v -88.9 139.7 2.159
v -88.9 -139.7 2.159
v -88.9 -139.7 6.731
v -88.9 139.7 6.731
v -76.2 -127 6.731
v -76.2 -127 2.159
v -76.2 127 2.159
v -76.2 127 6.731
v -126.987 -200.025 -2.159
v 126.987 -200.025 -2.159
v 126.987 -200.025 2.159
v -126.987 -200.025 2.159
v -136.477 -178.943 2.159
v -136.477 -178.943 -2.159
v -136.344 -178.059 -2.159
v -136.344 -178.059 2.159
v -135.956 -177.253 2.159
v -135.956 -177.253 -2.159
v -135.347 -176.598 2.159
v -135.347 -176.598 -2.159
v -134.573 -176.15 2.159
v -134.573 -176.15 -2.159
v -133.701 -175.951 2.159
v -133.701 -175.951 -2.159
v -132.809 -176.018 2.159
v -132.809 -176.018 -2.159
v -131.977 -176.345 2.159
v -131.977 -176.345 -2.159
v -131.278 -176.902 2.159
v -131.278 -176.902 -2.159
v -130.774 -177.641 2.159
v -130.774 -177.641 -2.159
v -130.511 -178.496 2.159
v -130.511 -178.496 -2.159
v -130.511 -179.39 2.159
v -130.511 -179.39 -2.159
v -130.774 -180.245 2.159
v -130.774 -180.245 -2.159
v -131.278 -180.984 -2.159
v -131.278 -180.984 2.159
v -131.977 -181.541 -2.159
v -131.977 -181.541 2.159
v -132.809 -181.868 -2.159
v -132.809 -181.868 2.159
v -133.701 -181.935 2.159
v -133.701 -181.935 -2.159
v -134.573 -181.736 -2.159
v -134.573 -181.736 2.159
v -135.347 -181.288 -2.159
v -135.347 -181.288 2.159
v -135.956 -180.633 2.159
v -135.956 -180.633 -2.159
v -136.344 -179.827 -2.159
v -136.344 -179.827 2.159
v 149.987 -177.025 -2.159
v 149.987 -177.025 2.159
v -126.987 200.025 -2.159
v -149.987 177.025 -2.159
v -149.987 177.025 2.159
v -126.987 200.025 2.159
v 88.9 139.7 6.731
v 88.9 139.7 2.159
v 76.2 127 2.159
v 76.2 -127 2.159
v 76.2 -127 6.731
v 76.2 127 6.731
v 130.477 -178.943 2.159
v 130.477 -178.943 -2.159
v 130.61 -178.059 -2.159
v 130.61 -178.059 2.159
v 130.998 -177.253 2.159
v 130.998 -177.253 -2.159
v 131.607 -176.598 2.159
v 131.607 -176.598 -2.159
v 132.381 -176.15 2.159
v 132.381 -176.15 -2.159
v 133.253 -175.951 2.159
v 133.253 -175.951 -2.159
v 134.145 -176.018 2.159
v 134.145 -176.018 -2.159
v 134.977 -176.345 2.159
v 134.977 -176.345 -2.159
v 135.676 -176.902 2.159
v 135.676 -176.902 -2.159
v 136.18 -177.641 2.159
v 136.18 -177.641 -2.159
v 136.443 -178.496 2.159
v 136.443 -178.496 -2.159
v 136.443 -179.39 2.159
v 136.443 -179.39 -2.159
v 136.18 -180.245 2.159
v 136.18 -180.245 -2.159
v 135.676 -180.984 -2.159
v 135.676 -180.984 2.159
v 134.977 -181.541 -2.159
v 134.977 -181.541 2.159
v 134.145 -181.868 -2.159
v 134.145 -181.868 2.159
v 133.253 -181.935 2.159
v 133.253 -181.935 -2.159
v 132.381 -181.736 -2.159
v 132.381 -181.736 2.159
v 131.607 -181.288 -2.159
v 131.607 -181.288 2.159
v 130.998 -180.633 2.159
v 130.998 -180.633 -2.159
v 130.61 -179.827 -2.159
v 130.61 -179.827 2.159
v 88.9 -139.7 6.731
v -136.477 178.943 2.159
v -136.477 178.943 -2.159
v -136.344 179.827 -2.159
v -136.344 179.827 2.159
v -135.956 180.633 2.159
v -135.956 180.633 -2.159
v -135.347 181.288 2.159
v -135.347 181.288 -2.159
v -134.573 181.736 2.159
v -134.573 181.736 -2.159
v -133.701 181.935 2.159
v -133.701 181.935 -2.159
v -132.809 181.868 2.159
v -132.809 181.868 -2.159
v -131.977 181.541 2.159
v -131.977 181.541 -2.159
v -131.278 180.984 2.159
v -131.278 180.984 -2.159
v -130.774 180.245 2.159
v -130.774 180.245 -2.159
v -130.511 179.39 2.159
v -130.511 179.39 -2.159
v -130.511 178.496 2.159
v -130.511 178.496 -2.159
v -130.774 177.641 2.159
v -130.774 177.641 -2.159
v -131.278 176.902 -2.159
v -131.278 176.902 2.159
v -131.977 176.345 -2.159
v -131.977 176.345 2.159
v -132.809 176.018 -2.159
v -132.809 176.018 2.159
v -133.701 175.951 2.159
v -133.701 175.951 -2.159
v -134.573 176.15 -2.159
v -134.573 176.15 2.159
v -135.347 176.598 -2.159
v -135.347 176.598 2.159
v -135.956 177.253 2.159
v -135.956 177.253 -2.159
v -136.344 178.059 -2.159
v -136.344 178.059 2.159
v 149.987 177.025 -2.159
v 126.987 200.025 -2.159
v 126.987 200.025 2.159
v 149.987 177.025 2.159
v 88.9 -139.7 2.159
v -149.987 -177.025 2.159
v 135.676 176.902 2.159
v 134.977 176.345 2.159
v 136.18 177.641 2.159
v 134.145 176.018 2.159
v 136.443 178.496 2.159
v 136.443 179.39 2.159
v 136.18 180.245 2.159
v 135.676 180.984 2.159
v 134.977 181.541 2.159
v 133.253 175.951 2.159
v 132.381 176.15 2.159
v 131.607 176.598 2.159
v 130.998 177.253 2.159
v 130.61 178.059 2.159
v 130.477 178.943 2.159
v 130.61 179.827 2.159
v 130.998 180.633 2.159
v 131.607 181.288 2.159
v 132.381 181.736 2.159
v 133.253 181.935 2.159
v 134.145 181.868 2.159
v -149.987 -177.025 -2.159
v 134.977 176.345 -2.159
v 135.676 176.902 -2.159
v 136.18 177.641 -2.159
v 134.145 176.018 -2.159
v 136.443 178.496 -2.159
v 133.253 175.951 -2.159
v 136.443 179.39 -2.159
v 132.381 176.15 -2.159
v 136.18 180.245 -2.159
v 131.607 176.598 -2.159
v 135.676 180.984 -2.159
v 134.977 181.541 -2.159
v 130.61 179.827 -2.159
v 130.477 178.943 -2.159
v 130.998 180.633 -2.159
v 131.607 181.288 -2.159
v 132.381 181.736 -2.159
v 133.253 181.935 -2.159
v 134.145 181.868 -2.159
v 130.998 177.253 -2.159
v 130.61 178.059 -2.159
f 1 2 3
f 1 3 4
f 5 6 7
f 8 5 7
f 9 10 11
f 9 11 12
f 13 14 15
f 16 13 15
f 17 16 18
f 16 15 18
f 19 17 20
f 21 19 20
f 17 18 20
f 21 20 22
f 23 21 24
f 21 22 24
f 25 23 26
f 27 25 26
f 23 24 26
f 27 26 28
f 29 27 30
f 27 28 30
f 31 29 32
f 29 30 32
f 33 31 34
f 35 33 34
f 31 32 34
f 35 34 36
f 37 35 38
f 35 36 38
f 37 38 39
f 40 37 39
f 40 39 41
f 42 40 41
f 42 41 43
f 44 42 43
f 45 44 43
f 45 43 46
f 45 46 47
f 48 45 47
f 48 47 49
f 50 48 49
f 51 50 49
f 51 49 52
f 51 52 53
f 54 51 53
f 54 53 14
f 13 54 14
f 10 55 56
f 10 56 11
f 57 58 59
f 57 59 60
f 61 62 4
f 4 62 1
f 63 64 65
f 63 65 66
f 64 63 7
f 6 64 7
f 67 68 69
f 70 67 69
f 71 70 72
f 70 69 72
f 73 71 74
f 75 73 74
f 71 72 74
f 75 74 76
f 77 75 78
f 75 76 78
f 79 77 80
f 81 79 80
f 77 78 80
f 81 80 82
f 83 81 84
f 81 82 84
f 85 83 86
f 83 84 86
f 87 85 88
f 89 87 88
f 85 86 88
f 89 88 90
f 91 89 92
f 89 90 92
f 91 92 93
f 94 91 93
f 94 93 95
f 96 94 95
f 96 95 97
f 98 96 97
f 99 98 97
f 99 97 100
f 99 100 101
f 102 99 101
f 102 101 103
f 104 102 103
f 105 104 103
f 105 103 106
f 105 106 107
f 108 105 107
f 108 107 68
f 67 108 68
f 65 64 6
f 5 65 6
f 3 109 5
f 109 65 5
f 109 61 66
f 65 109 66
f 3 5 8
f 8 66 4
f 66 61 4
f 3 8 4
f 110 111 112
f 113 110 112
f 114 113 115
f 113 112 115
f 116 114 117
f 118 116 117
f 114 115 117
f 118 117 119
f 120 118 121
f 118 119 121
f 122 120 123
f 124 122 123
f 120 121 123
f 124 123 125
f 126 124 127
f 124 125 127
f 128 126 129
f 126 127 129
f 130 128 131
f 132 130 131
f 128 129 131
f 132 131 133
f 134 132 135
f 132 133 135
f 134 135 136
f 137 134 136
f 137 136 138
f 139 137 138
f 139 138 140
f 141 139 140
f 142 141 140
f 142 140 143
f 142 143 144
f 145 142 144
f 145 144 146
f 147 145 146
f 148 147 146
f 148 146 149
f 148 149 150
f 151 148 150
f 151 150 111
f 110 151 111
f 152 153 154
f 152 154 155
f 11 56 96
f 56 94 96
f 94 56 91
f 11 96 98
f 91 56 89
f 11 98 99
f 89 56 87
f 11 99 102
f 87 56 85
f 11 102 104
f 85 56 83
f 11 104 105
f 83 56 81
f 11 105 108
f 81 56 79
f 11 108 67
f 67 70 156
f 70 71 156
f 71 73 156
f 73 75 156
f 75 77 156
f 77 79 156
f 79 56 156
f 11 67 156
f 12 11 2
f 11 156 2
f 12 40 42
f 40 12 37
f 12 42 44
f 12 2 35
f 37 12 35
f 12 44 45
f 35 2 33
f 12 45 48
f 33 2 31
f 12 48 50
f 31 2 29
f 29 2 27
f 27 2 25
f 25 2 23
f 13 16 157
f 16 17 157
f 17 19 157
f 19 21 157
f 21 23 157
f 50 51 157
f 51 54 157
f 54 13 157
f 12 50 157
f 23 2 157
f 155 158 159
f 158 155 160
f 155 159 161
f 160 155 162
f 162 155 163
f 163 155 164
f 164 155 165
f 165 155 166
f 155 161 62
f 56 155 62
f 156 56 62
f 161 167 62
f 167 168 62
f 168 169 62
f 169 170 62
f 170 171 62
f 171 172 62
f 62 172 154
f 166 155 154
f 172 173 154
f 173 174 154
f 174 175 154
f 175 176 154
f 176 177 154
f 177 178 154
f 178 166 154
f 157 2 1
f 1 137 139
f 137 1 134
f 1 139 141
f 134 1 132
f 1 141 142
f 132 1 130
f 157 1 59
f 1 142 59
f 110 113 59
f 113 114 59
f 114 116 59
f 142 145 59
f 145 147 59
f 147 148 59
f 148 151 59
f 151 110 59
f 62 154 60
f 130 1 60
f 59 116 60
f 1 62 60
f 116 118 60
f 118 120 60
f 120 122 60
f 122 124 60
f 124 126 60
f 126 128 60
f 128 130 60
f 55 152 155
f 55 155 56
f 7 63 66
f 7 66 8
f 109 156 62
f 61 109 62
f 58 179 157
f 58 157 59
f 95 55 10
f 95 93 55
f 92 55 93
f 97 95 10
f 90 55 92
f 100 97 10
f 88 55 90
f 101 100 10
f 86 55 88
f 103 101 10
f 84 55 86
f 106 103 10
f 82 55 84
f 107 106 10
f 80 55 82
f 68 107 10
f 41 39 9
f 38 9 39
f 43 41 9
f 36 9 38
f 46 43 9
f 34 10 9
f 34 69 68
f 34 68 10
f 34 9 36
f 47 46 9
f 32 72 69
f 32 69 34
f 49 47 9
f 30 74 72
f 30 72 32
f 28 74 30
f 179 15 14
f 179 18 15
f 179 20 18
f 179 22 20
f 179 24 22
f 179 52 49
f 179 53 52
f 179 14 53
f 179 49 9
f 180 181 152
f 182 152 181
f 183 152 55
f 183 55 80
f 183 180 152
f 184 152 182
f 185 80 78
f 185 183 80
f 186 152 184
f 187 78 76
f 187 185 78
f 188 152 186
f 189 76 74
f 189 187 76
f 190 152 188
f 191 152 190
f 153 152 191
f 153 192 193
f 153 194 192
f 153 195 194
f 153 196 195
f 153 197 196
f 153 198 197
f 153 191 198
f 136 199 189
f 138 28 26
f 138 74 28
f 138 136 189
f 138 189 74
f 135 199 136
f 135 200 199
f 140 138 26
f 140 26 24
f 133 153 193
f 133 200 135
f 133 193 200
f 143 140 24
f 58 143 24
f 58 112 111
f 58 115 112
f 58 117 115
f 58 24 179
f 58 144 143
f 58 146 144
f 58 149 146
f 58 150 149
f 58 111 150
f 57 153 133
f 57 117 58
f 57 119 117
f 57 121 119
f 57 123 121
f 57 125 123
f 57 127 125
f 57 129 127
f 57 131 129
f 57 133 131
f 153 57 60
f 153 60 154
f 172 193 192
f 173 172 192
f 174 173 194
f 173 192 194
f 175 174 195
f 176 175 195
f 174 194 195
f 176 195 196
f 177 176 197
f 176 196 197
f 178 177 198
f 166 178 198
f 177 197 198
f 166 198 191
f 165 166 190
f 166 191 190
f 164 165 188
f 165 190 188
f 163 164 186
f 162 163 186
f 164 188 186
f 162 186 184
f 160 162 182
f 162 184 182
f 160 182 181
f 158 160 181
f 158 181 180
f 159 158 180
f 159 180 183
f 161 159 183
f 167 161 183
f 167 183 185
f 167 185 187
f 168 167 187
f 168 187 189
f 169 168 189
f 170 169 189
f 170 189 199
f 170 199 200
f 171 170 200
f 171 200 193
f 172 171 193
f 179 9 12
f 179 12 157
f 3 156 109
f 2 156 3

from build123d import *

# Parameters (mm, degrees)
BOSS_EXTRUDE1_DEPTH      = 2.159
BOSS_EXTRUDE1_DEPTH_BACK = 2.159
SKETCH6_W                = 177.8
SKETCH6_H                = 279.4
SKETCH6_W_2              = 152.4
SKETCH6_H_2              = 254
BOSS_EXTRUDE2_DEPTH      = 8.89
SKETCH7_R                = 3
CUT_EXTRUDE2_DEPTH       = 251.170207847


with BuildPart() as part:
    # Sketch3 → Boss-Extrude1 (new, two sides: drawn at the far end of the back side and taken through both)
    with BuildSketch(Plane.XY.offset(-BOSS_EXTRUDE1_DEPTH_BACK)):
        Polygon((-149.987, 177.025), (-126.987, 200.025), (126.987, 200.025), (149.987, 177.025), (149.987, -177.025), (126.987, -200.025), (-126.987, -200.025), (-149.987, -177.025), align=None)
    extrude(amount=BOSS_EXTRUDE1_DEPTH + BOSS_EXTRUDE1_DEPTH_BACK)

    # Sketch6 → Boss-Extrude2 (add)
    with BuildSketch(Plane(origin=(0, 0, -2.159), x_dir=(-1, 0, 0), z_dir=(0, 0, -1))):
        Rectangle(SKETCH6_W, SKETCH6_H)
        Rectangle(SKETCH6_W_2, SKETCH6_H_2, mode=Mode.SUBTRACT)
    extrude(amount=-BOSS_EXTRUDE2_DEPTH)

    # Sketch7 → Cut-Extrude2 (cut, through all)
    with BuildSketch(Plane(origin=(0, 0, -2.159), x_dir=(-1, 0, 0), z_dir=(0, 0, -1))):
        with Locations((133.477, 178.943)):
            Circle(SKETCH7_R)
        with Locations((-133.477, 178.943)):
            Circle(SKETCH7_R)
        with Locations((-133.477, -178.943)):
            Circle(SKETCH7_R)
        with Locations((133.477, -178.943)):
            Circle(SKETCH7_R)
    extrude(amount=-CUT_EXTRUDE2_DEPTH, mode=Mode.SUBTRACT)


solid = part.part
